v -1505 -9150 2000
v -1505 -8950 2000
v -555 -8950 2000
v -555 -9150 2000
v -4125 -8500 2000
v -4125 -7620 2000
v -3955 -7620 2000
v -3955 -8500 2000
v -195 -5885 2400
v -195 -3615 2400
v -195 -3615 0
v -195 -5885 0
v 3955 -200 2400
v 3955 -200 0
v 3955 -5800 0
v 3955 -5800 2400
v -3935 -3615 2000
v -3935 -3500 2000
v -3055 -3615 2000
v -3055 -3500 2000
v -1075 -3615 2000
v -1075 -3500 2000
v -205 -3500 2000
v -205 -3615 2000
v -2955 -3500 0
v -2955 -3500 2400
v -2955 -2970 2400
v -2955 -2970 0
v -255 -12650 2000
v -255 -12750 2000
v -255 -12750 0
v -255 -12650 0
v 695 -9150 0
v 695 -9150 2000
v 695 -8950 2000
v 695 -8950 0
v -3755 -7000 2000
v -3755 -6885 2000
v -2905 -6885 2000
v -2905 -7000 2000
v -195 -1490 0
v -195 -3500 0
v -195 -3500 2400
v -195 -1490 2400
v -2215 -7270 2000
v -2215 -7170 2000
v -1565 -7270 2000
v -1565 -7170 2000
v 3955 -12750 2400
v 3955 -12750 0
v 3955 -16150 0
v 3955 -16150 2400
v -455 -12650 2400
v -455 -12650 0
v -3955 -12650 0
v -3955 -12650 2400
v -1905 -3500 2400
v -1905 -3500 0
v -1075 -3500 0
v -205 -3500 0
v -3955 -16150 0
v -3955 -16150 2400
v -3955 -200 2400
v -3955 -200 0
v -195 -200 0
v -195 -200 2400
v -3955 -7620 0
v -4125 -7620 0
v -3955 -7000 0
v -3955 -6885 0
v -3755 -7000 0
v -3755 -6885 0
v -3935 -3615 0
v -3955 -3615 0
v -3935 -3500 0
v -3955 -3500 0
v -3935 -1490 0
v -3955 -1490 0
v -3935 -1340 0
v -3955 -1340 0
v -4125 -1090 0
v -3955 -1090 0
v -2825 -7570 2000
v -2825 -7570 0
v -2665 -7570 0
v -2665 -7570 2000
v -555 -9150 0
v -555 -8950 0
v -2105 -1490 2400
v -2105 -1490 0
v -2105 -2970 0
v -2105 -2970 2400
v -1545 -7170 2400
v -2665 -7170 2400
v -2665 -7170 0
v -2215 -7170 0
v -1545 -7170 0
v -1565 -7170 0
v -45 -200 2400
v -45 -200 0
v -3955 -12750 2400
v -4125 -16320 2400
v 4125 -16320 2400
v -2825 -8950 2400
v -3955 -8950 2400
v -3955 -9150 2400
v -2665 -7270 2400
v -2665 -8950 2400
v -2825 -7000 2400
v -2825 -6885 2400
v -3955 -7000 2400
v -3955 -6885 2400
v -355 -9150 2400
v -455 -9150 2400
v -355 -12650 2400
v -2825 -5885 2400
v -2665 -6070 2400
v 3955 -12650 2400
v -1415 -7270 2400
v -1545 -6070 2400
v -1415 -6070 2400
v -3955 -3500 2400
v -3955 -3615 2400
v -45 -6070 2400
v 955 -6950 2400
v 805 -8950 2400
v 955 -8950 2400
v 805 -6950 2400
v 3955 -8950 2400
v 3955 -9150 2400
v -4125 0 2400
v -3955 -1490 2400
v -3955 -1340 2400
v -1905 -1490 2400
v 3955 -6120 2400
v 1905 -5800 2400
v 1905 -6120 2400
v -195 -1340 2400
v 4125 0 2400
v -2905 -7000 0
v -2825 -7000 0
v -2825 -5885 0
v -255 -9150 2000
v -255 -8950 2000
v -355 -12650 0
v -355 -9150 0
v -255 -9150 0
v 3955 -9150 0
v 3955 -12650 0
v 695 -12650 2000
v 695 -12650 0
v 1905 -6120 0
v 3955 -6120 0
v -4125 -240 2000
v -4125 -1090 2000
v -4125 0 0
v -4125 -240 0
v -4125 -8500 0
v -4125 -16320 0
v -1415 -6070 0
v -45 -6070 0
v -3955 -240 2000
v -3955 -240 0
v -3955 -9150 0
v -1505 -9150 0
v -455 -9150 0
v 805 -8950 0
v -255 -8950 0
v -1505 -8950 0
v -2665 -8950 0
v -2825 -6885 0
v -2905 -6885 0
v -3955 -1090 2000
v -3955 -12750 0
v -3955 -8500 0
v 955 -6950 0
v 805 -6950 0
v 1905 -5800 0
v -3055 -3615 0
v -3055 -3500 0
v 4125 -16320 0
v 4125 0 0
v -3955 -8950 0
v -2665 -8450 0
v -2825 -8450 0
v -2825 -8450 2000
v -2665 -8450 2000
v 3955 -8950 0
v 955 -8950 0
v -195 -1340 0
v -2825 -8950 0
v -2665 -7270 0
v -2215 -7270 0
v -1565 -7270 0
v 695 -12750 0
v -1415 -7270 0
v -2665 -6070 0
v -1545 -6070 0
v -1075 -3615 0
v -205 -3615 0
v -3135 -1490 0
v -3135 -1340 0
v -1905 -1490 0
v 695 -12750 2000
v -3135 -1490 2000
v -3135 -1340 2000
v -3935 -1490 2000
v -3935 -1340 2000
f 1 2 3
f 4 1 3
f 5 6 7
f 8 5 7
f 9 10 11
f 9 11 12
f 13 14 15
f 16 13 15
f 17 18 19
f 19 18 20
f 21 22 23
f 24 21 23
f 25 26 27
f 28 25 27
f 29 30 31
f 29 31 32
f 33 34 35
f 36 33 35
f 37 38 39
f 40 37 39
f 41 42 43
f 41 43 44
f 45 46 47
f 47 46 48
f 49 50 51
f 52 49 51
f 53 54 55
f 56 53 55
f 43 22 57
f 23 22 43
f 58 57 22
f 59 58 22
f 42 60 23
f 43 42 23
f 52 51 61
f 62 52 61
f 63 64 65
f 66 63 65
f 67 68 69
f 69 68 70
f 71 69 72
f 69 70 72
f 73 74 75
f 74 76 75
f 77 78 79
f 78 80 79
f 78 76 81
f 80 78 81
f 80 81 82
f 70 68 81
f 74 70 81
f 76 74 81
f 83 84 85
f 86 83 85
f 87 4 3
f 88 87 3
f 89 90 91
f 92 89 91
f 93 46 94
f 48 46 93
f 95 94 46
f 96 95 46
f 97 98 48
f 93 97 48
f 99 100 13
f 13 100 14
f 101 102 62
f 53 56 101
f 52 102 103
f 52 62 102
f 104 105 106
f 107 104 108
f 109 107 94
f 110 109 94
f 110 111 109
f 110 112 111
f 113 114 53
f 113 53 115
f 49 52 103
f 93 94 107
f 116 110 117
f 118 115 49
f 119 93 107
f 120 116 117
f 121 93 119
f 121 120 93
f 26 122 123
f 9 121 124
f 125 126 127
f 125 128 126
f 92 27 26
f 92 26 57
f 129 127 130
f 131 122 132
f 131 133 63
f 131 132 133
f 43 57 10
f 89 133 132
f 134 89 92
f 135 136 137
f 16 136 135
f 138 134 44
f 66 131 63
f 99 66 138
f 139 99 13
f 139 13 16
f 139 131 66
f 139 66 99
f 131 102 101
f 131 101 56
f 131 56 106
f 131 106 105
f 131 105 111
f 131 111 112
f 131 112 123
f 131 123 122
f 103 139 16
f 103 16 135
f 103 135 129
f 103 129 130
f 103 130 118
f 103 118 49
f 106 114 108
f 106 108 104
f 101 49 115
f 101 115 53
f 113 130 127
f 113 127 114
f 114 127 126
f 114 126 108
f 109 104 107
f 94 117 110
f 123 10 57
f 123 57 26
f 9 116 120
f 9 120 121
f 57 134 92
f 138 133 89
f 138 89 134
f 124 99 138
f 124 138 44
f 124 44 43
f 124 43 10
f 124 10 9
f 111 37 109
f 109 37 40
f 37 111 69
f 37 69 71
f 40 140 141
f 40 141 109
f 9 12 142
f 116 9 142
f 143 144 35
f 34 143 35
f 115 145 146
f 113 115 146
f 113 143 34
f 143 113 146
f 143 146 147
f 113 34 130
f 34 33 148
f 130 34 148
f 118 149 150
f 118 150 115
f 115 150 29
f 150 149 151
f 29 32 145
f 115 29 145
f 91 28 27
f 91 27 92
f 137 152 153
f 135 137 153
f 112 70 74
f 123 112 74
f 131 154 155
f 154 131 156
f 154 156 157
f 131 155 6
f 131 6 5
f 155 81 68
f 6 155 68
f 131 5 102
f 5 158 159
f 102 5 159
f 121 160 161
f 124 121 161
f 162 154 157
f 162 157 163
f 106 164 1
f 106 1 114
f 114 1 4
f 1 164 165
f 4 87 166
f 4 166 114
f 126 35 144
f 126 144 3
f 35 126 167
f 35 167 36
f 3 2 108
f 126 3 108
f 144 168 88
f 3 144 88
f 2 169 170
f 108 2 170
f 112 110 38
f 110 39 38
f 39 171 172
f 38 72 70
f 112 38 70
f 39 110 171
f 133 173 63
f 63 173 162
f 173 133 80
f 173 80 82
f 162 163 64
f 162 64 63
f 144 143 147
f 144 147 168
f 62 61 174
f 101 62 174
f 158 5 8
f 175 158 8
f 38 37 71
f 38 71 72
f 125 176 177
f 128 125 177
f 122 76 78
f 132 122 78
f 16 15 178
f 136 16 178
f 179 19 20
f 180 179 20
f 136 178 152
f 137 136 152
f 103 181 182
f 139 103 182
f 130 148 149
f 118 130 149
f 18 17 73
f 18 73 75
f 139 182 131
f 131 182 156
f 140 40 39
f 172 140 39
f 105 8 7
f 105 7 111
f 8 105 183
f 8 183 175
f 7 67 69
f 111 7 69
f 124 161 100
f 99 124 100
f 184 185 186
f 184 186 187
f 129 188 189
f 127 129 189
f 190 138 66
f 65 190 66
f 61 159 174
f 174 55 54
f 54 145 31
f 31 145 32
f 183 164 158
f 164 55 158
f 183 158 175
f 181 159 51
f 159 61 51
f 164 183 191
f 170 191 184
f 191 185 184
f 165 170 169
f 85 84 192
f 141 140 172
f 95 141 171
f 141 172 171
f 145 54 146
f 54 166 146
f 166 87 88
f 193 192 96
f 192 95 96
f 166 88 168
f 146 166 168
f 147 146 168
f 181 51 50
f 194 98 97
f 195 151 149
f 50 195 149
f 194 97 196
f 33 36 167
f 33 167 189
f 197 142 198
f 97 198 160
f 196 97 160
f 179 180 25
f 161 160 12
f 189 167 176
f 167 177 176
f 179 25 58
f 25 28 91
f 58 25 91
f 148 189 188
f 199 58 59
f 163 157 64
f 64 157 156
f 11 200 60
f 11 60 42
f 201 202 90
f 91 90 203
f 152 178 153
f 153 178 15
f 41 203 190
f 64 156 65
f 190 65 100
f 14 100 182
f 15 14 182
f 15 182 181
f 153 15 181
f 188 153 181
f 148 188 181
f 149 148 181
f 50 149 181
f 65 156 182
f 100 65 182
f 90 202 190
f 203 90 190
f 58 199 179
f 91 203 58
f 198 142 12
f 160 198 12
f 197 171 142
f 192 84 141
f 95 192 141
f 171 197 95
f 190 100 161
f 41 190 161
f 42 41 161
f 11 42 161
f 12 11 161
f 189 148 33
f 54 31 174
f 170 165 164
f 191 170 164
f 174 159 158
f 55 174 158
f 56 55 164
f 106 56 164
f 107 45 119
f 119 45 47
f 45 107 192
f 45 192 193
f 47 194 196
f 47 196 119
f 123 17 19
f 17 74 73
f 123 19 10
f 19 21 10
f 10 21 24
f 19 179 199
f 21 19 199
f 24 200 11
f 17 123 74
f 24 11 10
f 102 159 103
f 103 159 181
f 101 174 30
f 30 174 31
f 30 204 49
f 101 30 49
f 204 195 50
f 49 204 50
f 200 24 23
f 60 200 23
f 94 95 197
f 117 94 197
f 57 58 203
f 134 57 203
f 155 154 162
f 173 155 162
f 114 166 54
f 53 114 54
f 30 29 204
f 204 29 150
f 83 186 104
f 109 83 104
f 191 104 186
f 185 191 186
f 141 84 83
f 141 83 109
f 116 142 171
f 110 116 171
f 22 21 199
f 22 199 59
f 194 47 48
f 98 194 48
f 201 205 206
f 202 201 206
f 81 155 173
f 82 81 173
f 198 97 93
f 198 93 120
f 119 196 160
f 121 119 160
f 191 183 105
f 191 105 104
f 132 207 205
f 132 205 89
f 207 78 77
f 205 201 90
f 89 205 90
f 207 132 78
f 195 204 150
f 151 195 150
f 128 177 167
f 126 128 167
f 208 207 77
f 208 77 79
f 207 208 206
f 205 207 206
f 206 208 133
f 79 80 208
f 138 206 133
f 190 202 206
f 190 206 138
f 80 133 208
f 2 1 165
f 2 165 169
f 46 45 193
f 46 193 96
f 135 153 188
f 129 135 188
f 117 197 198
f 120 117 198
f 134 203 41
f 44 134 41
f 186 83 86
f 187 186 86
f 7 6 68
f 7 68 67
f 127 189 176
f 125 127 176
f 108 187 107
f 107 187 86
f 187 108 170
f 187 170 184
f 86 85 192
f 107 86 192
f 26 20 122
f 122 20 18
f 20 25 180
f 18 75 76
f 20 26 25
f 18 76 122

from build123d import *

# Parameters (mm, degrees)
F0_W     = 1130
F0_H     = 1950
F0_W_2   = 1120
F0_H_2   = 1100
F0_W_3   = 3760
F0_H_3   = 1140
F0_W_4   = 1710
F0_H_4   = 2010
F0_W_5   = 850
F0_H_5   = 530
F1_DEPTH = 2400
F3_START = -400
F2_W     = 170
F2_H     = 850
F2_W_2   = 800
F2_H_2   = 150
F2_W_3   = 880
F2_H_3   = 115
F2_W_4   = 870
F2_W_5   = 850
F2_H_4   = 880
F2_W_6   = 650
F2_H_5   = 100
F2_W_7   = 160
F2_W_8   = 950
F2_H_6   = 200
F3_DEPTH = 2000


# Not quite as in the source:
# - a feature names something its author has since deleted; it is built from what else it names


with BuildPart() as f1:
    # F0 (on Top) → F1 (new body)
    with BuildSketch(Plane.XY):
        Polygon((4125, 0), (-4125, 0), (-4125, -9150), (-3955, -9150), (-455, -9150), (-355, -9150), (3955, -9150), (4125, -9150), align=None)
        with Locations((-3390, -7975)):
            Rectangle(F0_W, F0_H, mode=Mode.SUBTRACT)
        with Locations((-2105, -6620)):
            Rectangle(F0_W_2, F0_H_2, mode=Mode.SUBTRACT)
        Polygon((-3955, -5885), (-3955, -3615), (-195, -3615), (-195, -5885), (-2825, -5885), (-2825, -6885), (-3955, -6885), align=None, mode=Mode.SUBTRACT)
        Polygon((-3955, -3500), (-3955, -1490), (-2105, -1490), (-2105, -2970), (-2105, -3500), (-2955, -3500), align=None, mode=Mode.SUBTRACT)
        with Locations((-2075, -770)):
            Rectangle(F0_W_3, F0_H_3, mode=Mode.SUBTRACT)
        with Locations((-1050, -2495)):
            Rectangle(F0_W_4, F0_H_4, mode=Mode.SUBTRACT)
        Polygon((-45, -6070), (-45, -200), (3955, -200), (3955, -5800), (1905, -5800), (1905, -6120), (3955, -6120), (3955, -8950), (955, -8950), (955, -6950), (805, -6950), (805, -8950), (-2665, -8950), (-2665, -7270), (-1415, -7270), (-1415, -6070), align=None, mode=Mode.SUBTRACT)
        with Locations((-2530, -3235)):
            Rectangle(F0_W_5, F0_H_5)
        Polygon((-355, -9150), (-455, -9150), (-455, -12650), (-3955, -12650), (-3955, -12750), (-355, -12750), (3955, -12750), (3955, -12650), (-355, -12650), align=None)
        Polygon((-3955, -9150), (-4125, -9150), (-4125, -16320), (4125, -16320), (4125, -9150), (3955, -9150), (3955, -12650), (3955, -12750), (3955, -16150), (-3955, -16150), (-3955, -12750), (-3955, -12650), align=None)
    extrude(amount=F1_DEPTH)

    # F2 (on face) → F3 (cut)
    with BuildSketch(Plane.XY.offset(2400).offset(F3_START)):
        with Locations((-4040, -665)):
            Rectangle(F2_W, F2_H)
        with Locations((-3535, -1415)):
            Rectangle(F2_W_2, F2_H_2)
        with Locations((-3495, -3557.5)):
            Rectangle(F2_W_3, F2_H_3)
        with Locations((-640, -3557.5)):
            Rectangle(F2_W_4, F2_H_3)
        with Locations((-3330, -6942.5)):
            Rectangle(F2_W_5, F2_H_3)
        with Locations((-4040, -8060)):
            Rectangle(F2_W, F2_H_4)
        with Locations((-1890, -7220)):
            Rectangle(F2_W_6, F2_H_5)
        with Locations((-2745, -8010)):
            Rectangle(F2_W_7, F2_H_4)
        with Locations((-1030, -9050)):
            Rectangle(F2_W_8, F2_H_6)
        with Locations((220, -9050)):
            Rectangle(F2_W_8, F2_H_6)
        with Locations((220, -12700)):
            Rectangle(F2_W_8, F2_H_5)
    extrude(amount=-F3_DEPTH, mode=Mode.SUBTRACT)


solid = f1.part
